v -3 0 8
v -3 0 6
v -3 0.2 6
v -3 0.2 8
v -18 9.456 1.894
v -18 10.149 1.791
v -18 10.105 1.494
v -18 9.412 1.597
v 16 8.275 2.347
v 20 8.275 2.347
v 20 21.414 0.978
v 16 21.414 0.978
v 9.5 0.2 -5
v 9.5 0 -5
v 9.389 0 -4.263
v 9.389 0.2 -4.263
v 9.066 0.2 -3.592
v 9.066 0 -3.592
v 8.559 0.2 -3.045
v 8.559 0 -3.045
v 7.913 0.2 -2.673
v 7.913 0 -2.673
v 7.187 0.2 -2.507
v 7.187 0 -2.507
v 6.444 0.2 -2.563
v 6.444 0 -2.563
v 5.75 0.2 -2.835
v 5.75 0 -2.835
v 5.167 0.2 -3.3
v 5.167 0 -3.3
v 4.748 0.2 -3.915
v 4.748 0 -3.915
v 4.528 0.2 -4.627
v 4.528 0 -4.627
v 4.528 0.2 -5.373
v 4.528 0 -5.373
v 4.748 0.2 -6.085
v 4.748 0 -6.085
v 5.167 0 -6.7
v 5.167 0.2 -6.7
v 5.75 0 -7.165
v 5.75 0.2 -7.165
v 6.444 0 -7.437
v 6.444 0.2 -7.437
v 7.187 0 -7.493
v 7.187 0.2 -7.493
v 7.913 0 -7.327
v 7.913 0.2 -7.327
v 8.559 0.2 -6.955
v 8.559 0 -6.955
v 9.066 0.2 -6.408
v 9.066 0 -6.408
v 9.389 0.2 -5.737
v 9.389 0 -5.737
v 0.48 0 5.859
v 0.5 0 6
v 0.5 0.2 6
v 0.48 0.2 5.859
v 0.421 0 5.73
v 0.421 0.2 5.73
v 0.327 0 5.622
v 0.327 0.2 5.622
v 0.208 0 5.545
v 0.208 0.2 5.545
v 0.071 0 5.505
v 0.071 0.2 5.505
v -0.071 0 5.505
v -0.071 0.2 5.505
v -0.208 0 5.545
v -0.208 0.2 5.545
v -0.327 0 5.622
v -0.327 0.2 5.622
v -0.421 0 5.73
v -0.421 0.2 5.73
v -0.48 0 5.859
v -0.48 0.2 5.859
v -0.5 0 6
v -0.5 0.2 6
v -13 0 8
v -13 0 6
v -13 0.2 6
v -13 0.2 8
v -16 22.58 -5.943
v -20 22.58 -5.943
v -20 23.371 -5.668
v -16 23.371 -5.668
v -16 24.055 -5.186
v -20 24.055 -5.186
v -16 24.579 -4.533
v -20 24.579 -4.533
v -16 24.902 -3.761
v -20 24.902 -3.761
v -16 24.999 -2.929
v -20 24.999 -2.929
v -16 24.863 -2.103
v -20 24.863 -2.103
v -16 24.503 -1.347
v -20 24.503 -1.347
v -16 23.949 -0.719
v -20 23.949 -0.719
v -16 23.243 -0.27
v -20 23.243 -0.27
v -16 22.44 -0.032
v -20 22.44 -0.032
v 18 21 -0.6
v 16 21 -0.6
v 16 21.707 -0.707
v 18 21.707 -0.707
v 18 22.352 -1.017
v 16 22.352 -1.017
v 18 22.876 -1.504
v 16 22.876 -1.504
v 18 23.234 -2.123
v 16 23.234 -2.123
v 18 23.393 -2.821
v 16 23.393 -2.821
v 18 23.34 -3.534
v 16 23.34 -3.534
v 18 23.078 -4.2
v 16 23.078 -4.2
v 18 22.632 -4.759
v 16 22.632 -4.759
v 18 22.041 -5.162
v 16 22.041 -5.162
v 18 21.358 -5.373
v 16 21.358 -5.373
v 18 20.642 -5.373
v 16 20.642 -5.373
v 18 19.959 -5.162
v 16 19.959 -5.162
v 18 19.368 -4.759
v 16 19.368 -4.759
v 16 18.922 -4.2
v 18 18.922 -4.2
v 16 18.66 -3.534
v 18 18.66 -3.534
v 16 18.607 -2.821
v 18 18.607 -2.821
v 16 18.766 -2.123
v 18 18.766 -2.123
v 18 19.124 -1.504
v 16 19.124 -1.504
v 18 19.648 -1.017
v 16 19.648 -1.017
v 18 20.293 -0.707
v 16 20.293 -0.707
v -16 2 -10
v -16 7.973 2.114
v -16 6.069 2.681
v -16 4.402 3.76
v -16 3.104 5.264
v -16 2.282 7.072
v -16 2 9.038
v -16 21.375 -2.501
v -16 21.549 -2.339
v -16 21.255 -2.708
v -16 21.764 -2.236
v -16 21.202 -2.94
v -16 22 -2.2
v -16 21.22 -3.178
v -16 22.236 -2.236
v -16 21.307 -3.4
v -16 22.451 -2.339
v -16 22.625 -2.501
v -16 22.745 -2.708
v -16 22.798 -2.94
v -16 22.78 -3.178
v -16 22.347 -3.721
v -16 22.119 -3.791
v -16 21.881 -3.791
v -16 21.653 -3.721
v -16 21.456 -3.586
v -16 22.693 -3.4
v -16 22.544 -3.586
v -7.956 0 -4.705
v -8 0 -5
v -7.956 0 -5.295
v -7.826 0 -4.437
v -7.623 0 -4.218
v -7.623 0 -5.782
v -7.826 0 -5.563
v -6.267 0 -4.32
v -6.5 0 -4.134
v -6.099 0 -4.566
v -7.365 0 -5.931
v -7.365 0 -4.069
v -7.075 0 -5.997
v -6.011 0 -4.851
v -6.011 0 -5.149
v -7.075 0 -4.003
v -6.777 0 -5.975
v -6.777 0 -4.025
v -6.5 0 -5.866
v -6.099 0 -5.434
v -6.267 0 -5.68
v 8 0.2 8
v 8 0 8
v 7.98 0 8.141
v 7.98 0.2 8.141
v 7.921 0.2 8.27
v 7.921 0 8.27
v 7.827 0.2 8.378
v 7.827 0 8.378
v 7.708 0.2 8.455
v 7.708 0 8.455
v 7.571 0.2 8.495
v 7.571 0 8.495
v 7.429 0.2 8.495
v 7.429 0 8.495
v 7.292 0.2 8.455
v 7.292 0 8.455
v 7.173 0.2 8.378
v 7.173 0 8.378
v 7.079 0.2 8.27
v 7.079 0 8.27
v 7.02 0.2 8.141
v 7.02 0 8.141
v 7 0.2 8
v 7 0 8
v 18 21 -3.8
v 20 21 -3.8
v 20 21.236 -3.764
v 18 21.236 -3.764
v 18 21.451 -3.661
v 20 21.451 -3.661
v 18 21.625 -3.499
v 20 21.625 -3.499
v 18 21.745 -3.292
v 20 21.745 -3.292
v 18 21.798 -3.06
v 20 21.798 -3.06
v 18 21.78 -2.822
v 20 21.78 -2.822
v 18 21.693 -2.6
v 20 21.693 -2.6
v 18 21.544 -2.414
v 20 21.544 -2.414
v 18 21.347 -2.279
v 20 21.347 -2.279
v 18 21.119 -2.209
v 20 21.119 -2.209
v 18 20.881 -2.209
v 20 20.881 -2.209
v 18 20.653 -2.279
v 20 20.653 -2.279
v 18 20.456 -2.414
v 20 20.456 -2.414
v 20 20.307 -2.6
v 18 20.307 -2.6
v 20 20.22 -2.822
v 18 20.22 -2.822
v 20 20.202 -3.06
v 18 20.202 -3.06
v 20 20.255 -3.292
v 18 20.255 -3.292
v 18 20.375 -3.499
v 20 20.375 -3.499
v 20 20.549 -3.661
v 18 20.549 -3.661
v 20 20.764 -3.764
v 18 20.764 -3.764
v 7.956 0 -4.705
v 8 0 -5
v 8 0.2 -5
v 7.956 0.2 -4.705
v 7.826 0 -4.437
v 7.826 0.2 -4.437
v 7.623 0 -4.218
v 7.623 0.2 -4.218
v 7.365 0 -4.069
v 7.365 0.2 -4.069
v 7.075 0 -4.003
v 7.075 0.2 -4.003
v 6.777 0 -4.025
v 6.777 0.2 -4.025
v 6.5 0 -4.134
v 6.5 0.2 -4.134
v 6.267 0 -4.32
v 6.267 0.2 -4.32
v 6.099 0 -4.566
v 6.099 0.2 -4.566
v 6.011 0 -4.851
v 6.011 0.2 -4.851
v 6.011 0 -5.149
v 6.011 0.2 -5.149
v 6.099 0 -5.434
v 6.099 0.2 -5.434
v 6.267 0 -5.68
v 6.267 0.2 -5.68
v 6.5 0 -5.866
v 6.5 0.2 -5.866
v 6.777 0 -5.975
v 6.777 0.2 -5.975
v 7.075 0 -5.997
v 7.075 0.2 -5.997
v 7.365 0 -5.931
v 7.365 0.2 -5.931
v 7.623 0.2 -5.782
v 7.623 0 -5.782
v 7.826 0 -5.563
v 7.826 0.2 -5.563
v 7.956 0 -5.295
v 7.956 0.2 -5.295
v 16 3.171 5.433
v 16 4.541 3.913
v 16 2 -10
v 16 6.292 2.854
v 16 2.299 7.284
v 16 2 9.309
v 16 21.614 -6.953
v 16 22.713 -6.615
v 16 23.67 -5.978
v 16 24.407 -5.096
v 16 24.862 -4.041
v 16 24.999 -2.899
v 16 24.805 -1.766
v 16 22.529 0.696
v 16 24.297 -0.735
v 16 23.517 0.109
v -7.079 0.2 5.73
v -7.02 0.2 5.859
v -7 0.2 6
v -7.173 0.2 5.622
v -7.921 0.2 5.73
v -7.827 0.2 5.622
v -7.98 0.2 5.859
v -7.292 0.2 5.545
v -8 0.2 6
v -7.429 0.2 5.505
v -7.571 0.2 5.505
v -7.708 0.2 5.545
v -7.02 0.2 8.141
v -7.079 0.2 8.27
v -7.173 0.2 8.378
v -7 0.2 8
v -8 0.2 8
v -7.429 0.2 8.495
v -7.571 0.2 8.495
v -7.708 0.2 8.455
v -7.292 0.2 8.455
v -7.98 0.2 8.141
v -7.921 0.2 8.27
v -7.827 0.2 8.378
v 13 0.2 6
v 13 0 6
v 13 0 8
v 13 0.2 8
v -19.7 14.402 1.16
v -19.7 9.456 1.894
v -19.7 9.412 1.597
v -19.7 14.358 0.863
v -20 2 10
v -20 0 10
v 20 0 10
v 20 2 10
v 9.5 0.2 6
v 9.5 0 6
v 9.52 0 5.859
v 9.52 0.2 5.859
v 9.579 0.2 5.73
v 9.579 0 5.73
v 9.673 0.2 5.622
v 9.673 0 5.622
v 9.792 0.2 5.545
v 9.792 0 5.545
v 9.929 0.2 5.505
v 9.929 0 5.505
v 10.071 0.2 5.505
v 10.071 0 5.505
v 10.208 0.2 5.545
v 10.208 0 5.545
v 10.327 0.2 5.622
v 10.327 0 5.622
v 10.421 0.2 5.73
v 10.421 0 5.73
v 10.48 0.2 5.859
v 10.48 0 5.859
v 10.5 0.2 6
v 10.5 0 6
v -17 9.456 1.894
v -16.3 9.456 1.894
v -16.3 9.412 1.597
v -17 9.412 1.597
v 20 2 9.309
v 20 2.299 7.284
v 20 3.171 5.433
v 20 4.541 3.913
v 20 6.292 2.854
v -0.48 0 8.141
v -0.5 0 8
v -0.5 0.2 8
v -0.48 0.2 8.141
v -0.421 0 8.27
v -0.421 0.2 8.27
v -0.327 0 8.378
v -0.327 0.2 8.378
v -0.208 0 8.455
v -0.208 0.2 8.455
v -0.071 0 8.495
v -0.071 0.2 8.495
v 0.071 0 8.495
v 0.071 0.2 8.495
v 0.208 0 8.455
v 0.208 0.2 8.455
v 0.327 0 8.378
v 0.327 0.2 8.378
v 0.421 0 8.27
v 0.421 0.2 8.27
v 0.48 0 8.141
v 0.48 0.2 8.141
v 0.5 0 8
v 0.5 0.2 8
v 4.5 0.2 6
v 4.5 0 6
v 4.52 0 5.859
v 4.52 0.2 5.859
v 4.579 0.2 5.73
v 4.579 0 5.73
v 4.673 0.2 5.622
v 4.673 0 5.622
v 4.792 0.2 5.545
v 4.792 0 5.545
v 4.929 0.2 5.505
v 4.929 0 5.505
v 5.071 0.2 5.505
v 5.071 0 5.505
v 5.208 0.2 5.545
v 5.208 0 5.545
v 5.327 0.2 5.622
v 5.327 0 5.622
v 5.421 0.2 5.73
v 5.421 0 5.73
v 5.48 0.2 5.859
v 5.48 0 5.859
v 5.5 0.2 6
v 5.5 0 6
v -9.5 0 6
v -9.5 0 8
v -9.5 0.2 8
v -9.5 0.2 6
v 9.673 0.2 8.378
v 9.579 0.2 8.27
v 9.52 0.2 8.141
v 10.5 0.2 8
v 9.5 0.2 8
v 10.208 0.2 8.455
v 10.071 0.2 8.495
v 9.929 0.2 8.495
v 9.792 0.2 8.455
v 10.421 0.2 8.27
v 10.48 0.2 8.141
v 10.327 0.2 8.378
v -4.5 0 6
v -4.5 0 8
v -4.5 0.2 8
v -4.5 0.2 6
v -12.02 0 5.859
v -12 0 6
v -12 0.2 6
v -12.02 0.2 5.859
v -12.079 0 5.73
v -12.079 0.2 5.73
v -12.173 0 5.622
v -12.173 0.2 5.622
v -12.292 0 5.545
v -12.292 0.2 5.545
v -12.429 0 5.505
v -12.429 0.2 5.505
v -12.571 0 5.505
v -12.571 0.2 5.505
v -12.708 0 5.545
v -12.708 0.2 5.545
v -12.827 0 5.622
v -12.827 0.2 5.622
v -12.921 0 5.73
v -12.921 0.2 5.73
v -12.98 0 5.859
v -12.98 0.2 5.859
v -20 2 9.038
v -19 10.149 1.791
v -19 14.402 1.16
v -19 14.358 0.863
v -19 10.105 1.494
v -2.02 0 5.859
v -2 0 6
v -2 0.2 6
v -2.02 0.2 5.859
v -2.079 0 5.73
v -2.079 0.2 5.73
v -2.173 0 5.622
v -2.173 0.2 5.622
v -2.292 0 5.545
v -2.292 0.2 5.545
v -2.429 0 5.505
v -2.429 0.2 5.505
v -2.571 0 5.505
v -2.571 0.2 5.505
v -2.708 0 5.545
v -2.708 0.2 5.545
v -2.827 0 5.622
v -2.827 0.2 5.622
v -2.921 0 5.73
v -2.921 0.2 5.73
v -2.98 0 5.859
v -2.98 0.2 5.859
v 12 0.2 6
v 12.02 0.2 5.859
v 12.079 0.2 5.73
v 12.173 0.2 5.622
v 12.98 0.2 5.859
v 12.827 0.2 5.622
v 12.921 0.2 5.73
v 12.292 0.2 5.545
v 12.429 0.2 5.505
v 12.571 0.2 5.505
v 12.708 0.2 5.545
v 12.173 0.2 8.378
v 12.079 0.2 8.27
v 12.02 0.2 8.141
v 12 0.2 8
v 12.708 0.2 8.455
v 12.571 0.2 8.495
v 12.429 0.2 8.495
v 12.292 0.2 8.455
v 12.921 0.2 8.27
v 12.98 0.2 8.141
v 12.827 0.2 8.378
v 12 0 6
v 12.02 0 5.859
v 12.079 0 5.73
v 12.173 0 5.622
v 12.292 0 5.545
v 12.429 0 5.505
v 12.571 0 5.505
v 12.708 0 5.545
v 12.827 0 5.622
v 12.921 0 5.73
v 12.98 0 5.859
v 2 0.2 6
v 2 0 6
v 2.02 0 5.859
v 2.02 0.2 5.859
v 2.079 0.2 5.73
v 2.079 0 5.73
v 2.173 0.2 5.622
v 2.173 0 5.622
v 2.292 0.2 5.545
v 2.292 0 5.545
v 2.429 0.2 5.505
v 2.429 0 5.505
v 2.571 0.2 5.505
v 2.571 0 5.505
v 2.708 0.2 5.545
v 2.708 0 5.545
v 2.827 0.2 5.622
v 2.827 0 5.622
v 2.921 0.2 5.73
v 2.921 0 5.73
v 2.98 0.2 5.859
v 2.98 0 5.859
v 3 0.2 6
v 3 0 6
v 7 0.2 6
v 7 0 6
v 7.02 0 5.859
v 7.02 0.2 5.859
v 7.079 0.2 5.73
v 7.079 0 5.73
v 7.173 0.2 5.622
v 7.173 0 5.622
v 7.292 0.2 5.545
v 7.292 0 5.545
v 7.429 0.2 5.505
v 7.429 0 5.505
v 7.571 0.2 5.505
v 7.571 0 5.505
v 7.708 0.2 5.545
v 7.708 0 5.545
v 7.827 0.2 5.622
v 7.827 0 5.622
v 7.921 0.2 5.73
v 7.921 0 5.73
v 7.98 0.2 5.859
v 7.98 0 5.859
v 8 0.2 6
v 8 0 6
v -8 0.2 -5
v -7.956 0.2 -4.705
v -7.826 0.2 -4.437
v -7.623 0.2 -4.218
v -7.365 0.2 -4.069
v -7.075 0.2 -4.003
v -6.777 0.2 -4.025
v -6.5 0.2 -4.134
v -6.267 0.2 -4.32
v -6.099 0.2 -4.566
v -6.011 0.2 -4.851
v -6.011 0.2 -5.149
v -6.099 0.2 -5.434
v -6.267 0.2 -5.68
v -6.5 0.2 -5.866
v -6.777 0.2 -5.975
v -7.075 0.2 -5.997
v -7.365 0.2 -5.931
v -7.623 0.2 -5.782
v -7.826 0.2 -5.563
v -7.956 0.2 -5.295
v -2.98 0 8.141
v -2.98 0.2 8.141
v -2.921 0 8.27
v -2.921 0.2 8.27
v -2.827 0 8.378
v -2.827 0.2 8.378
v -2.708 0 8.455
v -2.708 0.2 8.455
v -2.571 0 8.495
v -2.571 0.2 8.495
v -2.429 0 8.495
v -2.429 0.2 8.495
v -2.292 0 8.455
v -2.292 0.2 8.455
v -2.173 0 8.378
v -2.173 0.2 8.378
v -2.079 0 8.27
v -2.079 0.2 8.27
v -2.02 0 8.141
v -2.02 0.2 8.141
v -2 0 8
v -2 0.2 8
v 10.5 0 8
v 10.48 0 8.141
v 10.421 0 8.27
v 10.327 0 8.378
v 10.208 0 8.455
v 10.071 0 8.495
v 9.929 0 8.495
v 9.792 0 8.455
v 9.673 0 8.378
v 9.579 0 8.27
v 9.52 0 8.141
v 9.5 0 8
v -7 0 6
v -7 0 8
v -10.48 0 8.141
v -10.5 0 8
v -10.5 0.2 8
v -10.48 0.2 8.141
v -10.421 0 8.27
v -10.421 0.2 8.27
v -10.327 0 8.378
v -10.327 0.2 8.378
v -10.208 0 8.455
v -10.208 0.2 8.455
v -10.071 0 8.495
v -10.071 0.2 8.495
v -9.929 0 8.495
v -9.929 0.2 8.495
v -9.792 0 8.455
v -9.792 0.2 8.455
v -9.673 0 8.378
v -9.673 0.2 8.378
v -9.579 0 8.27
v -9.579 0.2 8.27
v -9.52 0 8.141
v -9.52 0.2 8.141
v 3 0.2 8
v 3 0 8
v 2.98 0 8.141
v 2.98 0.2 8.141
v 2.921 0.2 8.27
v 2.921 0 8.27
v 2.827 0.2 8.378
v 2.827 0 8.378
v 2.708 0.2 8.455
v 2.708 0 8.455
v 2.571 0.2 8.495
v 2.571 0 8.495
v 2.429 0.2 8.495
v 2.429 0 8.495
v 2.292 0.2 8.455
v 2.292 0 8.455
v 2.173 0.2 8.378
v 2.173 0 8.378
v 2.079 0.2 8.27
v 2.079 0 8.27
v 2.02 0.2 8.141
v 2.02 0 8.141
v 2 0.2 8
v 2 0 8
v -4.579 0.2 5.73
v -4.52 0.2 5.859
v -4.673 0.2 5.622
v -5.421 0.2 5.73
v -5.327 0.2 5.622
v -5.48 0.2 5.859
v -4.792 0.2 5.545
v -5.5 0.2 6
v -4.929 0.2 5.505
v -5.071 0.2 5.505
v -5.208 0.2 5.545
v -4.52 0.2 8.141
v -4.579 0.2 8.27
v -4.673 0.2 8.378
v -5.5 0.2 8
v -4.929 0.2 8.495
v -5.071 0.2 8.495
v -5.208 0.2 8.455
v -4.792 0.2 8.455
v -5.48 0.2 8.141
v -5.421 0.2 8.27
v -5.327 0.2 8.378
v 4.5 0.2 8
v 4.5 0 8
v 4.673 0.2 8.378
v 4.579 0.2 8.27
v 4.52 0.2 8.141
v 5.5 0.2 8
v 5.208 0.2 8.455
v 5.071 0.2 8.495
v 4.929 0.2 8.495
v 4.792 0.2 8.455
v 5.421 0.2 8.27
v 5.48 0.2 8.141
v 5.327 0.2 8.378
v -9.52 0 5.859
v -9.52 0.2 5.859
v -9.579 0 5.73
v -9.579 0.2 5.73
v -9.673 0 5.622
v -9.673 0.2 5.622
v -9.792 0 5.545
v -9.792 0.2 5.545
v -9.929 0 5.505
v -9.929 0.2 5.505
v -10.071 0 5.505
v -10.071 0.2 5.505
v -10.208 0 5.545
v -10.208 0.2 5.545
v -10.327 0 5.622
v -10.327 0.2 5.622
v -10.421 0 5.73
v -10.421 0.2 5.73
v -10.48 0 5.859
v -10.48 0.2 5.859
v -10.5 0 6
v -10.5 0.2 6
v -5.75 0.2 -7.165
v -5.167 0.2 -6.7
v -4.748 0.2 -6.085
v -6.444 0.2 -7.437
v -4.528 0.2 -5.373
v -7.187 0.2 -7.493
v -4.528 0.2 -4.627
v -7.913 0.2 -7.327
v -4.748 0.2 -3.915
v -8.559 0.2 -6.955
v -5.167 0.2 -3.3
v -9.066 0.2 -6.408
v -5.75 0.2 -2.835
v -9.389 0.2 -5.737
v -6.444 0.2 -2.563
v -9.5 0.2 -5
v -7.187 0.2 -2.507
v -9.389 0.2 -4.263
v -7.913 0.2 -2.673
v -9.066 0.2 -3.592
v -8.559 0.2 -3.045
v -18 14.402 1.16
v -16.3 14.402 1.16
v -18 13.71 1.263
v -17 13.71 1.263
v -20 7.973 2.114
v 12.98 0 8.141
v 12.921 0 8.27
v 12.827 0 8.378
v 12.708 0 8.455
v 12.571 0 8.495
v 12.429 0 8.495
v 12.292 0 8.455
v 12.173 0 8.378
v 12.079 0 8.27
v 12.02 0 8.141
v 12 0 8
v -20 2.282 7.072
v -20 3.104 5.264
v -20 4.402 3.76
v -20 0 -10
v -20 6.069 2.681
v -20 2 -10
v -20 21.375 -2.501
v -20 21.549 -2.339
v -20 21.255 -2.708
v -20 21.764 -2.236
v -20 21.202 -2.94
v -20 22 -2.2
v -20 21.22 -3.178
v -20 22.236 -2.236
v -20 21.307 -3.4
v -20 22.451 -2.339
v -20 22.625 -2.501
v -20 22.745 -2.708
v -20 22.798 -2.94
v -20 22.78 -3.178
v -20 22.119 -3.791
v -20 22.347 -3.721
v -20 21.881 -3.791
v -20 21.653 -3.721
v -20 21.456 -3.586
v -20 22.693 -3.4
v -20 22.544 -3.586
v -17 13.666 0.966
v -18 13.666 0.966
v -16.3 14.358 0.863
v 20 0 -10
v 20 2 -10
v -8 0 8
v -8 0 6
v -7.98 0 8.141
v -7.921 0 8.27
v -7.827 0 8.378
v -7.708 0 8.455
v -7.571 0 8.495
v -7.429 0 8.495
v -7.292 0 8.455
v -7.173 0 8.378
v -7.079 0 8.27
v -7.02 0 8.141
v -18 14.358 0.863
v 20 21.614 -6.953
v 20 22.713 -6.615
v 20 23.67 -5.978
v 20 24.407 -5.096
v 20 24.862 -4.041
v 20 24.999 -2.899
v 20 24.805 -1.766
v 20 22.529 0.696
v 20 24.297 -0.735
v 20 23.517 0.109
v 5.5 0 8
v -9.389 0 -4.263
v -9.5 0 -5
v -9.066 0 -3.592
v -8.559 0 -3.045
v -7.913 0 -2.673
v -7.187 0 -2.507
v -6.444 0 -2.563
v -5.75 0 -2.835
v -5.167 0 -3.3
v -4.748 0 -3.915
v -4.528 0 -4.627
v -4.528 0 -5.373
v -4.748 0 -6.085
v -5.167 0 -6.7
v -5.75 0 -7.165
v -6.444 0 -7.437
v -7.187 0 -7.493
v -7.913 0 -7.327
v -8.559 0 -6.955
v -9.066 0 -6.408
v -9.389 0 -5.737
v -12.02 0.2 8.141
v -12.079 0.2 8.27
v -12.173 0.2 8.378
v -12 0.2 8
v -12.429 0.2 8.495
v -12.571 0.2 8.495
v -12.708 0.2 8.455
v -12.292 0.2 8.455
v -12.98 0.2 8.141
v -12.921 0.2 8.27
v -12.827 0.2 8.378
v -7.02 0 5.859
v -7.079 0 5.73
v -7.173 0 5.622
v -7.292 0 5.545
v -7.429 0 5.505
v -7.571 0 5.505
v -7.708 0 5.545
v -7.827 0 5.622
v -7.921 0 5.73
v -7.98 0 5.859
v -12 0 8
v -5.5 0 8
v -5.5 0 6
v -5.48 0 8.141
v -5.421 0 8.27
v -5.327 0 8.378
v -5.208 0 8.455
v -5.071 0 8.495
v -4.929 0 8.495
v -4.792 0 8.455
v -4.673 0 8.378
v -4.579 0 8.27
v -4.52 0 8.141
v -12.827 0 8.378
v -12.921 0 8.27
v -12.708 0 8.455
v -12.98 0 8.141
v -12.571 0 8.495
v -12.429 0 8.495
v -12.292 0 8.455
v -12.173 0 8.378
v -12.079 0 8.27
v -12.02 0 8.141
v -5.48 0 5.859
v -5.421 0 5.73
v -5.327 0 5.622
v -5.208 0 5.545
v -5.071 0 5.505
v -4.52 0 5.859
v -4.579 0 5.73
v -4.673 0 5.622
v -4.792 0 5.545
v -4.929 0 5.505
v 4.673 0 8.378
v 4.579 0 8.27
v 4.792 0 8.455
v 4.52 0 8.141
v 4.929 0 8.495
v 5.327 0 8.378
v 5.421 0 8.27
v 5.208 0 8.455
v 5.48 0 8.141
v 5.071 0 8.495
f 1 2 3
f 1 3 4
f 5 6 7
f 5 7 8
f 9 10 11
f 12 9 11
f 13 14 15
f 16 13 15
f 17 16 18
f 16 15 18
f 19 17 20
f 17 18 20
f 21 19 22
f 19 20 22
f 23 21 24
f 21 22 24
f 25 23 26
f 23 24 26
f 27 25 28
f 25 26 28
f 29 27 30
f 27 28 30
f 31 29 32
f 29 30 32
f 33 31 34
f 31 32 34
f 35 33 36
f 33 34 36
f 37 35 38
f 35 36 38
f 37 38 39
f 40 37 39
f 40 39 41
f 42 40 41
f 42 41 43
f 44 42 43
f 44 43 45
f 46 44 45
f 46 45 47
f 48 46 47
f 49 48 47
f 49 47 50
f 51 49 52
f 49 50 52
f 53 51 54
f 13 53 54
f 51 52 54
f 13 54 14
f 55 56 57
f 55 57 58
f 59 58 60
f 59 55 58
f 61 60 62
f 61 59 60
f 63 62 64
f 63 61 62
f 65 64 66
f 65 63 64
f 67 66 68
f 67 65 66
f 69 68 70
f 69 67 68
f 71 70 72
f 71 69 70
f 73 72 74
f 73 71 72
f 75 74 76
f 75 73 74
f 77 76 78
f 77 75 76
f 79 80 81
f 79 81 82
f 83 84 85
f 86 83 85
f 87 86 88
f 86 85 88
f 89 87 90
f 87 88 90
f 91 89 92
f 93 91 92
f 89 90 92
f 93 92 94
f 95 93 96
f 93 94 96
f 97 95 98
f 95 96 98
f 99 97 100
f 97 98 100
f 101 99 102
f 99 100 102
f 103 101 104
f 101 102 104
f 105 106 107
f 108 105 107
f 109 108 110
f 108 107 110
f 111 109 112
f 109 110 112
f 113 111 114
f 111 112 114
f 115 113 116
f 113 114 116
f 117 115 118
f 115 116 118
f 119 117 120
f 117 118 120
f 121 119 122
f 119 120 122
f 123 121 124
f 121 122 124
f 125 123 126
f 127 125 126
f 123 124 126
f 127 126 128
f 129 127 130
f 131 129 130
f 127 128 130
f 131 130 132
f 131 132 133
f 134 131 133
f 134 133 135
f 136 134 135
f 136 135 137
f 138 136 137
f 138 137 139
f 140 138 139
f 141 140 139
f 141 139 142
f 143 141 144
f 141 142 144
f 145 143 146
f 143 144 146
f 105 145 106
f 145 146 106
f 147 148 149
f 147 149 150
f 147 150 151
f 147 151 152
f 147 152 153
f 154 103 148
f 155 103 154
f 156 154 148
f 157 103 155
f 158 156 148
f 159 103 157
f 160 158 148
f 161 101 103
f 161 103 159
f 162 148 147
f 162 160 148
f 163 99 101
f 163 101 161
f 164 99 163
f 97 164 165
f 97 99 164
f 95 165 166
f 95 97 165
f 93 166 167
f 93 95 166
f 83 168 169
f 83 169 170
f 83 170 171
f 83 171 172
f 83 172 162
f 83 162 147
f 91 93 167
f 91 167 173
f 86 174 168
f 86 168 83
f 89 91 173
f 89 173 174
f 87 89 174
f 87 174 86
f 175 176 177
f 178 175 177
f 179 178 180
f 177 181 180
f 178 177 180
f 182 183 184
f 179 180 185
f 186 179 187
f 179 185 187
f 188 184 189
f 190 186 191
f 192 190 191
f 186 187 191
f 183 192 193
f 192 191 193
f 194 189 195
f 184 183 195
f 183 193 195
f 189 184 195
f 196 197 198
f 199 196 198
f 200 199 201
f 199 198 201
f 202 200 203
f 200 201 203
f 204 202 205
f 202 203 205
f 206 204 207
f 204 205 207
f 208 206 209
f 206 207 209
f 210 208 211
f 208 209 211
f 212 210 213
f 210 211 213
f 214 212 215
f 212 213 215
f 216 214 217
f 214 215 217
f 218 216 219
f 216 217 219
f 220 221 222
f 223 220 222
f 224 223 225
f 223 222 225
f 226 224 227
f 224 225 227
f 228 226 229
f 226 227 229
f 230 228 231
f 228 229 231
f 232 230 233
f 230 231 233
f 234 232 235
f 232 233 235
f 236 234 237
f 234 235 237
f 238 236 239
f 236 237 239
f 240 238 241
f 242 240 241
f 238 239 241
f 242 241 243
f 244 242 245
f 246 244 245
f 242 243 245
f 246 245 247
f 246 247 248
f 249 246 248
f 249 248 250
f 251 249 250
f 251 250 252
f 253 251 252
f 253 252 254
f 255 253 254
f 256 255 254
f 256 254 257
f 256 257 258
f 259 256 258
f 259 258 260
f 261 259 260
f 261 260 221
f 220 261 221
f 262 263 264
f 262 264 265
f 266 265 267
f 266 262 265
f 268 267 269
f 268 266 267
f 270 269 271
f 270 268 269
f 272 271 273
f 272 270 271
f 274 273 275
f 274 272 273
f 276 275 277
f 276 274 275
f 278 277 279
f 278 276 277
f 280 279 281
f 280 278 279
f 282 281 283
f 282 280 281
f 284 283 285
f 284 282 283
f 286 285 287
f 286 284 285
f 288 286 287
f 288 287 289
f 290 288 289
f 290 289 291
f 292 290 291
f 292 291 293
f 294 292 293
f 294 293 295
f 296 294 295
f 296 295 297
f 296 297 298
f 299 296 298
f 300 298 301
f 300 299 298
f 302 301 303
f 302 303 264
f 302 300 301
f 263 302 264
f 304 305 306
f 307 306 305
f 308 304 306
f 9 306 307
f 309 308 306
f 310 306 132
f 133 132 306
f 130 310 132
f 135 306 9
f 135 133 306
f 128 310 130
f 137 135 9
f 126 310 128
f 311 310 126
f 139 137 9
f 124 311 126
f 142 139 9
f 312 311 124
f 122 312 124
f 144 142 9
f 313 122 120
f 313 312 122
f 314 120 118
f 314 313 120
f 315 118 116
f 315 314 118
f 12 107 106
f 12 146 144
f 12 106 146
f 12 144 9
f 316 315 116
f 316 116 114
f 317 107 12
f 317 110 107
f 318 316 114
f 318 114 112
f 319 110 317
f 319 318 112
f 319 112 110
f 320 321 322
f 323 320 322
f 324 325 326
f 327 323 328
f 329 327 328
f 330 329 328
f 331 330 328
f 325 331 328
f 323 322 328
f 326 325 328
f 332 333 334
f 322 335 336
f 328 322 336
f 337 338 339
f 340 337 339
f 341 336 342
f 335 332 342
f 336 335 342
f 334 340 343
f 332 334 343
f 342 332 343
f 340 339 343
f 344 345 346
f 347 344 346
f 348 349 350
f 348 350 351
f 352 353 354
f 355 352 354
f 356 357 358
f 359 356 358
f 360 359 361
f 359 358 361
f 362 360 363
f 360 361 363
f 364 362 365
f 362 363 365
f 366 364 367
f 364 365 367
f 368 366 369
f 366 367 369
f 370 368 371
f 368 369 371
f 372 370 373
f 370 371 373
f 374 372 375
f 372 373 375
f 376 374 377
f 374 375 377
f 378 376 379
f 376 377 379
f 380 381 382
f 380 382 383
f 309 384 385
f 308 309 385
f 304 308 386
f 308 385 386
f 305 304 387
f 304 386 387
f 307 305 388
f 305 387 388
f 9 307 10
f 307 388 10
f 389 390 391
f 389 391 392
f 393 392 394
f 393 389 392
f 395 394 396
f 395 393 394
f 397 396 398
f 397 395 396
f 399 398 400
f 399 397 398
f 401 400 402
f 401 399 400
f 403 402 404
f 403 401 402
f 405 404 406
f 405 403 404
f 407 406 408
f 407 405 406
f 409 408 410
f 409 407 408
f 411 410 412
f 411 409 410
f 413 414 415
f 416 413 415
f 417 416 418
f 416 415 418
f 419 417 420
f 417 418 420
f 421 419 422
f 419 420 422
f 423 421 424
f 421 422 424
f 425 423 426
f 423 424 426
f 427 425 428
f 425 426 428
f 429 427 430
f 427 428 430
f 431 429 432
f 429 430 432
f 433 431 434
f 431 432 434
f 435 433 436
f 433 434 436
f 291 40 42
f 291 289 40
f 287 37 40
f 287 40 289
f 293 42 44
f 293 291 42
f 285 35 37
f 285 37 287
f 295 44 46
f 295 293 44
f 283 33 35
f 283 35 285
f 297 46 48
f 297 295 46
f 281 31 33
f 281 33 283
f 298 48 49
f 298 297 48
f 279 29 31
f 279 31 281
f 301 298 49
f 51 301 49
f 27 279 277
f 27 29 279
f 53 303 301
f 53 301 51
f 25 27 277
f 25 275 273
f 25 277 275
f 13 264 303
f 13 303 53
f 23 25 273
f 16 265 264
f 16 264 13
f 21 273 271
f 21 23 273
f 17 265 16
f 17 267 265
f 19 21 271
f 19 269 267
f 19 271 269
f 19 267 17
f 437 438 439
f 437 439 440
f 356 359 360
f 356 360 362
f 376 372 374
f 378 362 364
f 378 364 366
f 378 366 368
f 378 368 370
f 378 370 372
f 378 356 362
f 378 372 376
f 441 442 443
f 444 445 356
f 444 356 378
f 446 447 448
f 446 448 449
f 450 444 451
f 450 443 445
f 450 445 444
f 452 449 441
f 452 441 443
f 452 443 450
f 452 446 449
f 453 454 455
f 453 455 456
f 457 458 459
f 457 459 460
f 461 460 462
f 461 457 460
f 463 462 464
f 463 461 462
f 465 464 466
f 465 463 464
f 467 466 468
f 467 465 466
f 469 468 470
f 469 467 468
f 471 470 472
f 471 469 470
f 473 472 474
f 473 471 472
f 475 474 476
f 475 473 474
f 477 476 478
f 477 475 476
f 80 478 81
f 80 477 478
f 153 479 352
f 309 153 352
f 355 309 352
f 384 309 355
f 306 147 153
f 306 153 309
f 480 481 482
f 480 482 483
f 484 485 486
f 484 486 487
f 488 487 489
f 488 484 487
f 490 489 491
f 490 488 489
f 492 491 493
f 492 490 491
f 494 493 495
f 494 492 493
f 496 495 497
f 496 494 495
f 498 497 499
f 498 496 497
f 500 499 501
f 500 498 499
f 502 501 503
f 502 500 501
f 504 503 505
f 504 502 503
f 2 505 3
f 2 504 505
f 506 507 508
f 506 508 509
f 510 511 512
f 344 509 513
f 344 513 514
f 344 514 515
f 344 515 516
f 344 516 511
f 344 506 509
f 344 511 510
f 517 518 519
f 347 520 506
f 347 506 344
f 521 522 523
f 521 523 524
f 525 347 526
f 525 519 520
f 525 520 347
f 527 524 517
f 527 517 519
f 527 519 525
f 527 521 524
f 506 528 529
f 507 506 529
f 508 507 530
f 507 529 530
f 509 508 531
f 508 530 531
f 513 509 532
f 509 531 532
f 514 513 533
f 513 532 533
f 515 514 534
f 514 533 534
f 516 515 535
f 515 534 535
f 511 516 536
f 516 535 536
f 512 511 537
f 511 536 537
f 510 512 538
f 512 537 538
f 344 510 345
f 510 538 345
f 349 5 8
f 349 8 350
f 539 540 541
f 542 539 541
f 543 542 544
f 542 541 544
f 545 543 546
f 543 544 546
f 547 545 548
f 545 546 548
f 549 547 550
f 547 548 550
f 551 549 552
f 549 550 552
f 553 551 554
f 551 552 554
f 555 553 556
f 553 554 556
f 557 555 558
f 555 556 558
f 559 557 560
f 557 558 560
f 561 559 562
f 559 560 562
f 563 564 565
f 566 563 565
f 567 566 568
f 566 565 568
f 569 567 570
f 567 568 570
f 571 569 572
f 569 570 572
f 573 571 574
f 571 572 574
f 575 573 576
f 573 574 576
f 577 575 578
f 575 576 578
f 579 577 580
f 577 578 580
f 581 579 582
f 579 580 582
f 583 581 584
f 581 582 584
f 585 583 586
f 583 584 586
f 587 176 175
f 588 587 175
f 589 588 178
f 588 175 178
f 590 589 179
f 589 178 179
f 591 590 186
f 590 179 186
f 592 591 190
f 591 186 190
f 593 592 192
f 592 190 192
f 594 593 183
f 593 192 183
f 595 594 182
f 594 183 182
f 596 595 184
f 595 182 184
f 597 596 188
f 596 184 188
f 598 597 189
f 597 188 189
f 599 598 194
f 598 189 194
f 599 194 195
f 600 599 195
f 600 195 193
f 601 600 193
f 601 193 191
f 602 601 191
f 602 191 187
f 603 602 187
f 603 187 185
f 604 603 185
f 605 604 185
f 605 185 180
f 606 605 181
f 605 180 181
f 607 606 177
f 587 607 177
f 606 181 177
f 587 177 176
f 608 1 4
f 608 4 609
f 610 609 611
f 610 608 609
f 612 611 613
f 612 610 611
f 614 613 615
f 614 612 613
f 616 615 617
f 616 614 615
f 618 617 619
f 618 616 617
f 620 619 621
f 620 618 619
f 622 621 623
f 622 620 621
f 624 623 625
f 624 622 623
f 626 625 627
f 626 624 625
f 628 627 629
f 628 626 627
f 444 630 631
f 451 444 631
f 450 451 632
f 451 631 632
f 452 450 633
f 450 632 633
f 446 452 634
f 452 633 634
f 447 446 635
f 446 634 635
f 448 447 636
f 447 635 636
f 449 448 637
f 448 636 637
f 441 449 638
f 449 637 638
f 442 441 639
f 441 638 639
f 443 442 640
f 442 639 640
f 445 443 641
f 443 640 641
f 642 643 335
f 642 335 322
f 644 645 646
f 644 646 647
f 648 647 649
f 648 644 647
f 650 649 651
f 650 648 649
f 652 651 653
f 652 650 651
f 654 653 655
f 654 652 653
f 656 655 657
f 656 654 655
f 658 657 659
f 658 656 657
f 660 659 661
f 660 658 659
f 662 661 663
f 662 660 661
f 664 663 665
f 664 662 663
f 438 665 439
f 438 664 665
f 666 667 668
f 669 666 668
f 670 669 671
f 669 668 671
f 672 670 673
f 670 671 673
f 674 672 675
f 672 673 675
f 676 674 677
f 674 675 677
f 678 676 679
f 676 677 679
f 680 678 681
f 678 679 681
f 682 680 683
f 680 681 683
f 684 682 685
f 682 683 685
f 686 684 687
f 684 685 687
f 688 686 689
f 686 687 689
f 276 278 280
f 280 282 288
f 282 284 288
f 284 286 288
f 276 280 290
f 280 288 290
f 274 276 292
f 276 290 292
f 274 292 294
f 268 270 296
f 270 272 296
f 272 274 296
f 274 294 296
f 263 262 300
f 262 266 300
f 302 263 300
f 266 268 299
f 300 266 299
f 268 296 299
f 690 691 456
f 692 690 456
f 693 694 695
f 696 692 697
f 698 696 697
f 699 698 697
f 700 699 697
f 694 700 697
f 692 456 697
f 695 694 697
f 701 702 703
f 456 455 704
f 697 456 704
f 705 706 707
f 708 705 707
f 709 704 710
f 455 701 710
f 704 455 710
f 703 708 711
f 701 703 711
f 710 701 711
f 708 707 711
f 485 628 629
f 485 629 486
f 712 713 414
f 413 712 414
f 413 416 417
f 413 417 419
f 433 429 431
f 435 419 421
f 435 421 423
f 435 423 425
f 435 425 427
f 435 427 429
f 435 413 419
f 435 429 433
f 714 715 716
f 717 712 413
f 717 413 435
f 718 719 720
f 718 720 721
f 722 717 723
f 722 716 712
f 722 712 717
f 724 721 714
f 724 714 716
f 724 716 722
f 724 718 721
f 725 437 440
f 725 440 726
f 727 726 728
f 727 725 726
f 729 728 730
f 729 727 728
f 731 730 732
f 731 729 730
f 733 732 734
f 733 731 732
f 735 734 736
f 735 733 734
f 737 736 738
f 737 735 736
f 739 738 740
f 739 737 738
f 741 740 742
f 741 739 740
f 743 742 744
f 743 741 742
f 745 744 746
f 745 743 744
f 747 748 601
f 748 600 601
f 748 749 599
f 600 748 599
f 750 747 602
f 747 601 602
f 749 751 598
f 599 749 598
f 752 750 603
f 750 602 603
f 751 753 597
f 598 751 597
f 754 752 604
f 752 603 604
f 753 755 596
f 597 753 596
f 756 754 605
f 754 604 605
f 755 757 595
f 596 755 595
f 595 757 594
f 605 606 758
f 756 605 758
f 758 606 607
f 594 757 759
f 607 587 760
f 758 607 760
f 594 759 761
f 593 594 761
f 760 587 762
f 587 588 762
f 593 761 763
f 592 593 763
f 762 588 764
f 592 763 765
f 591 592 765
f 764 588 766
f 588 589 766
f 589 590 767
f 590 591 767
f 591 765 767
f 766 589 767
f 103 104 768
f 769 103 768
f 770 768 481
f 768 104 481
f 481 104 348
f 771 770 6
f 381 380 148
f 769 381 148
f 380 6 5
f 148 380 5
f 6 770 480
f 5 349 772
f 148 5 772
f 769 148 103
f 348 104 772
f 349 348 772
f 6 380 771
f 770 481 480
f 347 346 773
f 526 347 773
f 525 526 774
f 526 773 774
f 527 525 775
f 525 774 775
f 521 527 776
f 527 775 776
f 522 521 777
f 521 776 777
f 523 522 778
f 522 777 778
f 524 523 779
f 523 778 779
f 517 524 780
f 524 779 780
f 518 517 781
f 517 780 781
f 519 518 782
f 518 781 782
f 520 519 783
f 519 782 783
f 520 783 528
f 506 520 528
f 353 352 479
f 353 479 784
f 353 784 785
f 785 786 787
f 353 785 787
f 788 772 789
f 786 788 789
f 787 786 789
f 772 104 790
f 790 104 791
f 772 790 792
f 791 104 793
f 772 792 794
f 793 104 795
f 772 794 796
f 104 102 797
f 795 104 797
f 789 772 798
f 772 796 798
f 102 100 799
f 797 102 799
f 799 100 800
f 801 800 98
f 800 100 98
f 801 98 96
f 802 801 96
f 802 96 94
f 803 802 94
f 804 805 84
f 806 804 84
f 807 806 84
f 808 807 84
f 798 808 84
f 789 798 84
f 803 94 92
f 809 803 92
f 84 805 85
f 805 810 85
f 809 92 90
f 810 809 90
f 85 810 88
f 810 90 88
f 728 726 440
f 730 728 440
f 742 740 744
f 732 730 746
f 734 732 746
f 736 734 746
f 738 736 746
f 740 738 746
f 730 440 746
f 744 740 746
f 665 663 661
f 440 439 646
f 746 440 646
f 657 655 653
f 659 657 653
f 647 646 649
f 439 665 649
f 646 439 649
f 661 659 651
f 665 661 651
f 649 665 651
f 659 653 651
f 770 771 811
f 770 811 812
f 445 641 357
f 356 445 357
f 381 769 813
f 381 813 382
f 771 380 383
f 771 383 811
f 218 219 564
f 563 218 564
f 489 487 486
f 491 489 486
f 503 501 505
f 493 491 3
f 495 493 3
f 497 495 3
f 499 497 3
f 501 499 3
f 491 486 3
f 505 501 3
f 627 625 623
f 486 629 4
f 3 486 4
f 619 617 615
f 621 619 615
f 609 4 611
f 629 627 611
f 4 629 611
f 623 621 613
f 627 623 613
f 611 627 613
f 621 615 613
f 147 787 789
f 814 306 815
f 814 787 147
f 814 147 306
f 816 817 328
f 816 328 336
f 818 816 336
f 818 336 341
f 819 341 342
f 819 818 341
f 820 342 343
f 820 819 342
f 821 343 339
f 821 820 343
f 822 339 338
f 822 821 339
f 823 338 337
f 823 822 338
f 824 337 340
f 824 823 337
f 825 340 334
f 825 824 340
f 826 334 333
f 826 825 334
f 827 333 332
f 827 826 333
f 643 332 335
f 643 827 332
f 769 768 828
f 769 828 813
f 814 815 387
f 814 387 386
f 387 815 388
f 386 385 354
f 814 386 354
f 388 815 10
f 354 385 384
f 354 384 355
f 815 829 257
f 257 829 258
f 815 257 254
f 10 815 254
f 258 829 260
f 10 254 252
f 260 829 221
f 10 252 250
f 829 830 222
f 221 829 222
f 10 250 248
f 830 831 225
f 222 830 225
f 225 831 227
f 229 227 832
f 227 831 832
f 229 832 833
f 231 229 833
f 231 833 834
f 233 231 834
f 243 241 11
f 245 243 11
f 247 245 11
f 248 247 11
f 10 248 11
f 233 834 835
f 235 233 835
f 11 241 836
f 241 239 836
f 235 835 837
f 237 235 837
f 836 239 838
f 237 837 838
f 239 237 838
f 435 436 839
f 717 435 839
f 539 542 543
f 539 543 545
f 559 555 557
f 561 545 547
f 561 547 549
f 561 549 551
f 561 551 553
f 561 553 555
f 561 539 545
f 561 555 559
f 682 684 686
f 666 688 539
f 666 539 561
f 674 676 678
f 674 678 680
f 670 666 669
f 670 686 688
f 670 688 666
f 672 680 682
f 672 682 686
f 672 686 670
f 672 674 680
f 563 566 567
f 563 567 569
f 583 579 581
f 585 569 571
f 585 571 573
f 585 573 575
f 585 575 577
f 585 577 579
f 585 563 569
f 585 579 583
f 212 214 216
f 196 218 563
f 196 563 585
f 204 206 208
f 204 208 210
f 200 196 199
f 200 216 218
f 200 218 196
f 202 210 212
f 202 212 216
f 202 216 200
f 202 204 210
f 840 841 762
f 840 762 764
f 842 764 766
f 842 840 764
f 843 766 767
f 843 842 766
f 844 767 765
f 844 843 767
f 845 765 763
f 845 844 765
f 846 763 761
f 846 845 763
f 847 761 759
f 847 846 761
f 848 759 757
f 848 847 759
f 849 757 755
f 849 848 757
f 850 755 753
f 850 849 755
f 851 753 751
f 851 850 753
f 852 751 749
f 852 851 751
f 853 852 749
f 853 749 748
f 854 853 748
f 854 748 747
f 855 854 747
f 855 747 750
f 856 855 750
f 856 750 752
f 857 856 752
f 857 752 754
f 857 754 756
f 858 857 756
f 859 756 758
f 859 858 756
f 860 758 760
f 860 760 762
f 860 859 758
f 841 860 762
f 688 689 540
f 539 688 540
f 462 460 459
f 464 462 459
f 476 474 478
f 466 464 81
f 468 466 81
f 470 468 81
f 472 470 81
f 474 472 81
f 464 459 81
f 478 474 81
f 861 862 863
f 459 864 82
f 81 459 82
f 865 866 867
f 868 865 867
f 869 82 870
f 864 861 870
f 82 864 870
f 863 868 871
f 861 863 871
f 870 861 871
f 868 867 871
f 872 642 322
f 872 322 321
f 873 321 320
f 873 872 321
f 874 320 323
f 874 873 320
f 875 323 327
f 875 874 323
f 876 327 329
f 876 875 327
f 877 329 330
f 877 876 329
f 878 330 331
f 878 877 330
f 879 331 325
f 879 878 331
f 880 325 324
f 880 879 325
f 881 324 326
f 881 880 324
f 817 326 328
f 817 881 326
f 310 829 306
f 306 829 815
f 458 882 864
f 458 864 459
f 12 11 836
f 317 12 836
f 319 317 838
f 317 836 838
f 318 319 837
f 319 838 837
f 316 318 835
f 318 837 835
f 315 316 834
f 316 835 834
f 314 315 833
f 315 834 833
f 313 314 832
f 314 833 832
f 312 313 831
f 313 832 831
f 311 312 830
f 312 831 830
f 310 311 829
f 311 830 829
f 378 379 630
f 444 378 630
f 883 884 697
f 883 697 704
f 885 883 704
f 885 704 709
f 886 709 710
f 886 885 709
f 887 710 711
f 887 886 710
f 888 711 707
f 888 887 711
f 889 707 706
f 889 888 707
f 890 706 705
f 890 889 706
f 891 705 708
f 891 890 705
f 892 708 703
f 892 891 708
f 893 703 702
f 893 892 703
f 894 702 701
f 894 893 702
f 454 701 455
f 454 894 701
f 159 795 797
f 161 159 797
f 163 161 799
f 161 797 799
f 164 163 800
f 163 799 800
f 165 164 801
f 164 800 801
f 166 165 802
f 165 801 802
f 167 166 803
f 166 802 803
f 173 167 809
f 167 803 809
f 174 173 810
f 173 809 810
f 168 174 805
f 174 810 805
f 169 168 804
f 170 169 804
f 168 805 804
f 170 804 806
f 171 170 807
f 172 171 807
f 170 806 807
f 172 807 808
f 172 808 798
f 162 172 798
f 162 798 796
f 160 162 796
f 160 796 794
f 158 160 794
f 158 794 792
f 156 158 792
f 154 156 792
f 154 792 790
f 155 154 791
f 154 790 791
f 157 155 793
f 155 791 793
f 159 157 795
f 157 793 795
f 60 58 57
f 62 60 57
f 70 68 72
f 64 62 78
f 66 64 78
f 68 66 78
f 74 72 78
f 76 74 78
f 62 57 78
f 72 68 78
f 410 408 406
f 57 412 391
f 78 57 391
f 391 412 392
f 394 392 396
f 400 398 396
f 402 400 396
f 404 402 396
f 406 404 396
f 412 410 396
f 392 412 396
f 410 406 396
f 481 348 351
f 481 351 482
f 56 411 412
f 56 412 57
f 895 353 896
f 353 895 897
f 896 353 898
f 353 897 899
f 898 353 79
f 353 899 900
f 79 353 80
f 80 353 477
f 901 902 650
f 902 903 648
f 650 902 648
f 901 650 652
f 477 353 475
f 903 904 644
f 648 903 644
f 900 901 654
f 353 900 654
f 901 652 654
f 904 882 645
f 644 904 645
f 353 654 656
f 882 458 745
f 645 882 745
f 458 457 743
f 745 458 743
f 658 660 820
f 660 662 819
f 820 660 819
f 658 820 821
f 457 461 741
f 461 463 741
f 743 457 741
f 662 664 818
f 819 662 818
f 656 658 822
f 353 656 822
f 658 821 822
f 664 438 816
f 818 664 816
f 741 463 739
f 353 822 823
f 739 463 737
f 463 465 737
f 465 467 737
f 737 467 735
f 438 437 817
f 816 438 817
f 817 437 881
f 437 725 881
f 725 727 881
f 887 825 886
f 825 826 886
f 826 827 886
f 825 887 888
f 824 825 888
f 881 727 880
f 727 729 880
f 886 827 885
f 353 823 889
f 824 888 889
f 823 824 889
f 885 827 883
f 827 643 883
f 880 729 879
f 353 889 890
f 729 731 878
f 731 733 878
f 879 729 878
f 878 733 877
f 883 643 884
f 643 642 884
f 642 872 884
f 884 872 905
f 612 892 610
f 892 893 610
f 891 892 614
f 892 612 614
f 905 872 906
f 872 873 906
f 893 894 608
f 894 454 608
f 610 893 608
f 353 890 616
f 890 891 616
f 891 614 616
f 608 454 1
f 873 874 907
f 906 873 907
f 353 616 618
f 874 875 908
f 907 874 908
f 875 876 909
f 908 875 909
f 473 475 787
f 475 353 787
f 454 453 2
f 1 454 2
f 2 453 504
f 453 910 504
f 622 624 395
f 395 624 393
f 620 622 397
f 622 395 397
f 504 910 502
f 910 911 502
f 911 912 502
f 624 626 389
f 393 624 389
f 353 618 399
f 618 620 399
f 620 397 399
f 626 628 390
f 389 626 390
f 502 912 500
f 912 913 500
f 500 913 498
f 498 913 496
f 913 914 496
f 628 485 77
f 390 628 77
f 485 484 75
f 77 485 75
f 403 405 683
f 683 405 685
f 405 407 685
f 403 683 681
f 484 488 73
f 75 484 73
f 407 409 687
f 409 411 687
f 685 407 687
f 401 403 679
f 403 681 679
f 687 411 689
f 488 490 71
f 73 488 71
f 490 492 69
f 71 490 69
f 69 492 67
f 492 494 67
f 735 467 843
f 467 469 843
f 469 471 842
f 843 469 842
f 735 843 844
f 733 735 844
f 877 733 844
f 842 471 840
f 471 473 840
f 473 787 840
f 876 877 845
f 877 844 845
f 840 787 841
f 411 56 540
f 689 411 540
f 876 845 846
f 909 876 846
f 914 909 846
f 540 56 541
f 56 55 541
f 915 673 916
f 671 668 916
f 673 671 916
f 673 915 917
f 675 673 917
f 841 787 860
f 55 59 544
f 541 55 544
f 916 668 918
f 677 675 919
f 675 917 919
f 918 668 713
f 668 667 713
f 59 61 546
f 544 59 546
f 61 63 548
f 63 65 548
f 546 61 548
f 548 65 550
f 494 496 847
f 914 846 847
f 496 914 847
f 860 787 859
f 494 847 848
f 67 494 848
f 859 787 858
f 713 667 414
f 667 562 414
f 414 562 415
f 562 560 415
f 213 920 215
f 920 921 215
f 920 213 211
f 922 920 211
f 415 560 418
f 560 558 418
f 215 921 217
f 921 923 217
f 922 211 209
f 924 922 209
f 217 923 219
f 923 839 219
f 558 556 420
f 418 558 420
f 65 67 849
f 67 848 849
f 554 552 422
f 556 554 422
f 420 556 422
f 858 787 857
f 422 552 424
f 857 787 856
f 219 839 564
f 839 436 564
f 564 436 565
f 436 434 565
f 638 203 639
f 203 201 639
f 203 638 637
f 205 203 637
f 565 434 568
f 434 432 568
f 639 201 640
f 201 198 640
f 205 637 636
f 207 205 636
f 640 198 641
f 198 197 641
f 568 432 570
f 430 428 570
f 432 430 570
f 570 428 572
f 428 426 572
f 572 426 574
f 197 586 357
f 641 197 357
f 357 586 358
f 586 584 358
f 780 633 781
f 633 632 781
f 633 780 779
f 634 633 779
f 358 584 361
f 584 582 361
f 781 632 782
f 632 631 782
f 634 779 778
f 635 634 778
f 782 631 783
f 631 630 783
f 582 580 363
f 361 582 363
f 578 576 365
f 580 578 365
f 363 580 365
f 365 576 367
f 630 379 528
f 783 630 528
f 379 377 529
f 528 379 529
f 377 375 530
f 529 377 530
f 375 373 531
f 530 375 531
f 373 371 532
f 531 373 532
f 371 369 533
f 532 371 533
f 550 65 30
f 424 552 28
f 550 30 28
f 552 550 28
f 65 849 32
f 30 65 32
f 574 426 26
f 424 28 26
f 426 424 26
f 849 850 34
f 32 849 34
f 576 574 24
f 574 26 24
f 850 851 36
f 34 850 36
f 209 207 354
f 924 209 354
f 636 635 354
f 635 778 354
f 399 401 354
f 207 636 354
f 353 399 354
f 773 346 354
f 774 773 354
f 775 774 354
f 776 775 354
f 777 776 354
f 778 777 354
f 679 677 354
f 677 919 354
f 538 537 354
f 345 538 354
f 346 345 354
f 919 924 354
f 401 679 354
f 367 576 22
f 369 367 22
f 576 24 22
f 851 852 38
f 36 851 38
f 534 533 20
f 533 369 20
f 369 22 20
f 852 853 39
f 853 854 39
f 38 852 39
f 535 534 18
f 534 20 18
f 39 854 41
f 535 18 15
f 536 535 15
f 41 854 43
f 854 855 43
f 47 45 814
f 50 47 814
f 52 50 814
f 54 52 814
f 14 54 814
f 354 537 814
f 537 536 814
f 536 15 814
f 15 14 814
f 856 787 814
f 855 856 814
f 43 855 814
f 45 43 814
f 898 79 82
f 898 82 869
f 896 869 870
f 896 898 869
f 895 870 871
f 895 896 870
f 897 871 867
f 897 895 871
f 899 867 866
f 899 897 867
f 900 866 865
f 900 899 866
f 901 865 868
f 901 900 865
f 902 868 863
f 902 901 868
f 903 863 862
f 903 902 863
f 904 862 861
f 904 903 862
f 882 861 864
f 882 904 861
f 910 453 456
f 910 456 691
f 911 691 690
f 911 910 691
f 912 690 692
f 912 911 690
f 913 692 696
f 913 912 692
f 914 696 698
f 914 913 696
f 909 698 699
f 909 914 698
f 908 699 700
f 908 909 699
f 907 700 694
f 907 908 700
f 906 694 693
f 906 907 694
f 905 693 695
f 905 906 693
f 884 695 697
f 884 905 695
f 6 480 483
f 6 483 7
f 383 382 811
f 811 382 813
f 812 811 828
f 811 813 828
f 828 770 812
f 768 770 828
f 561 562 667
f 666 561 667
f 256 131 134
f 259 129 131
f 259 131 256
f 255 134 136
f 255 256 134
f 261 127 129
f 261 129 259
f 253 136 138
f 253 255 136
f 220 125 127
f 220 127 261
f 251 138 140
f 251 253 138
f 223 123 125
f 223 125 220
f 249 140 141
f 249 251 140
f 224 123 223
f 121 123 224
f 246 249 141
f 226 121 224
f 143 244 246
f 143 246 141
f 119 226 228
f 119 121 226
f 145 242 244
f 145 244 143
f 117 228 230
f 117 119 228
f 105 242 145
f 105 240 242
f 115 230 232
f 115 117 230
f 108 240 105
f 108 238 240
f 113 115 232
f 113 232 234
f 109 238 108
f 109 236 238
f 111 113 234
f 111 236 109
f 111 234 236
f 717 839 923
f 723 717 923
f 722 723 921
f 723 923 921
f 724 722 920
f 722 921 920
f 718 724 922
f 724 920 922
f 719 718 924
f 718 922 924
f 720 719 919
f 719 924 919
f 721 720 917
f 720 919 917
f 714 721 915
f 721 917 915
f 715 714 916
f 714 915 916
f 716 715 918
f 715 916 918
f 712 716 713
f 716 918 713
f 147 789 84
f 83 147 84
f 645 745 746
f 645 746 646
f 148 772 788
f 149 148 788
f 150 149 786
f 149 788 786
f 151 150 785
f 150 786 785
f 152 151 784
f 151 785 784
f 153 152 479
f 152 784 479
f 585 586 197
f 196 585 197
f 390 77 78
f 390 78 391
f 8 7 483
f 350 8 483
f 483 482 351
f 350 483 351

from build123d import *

# Parameters (mm, degrees)
CROQUIS1_W              = 40
CROQUIS1_H              = 20
SALIENTE_EXTRUIR1_DEPTH = 2
CROQUIS3_R              = 0.8
SALIENTE_EXTRUIR2_DEPTH = 4
CROQUIS4_R              = 2.5
CROQUIS4_R_2            = 1
CORTAR_EXTRUIR1_DEPTH   = 0.2
CROQUIS6_R              = 0.8
SALIENTE_EXTRUIR3_DEPTH = 4
CROQUIS10_R             = 2.4
CORTAR_EXTRUIR4_DEPTH   = 2
CORTAR_EXTRUIR5_DEPTH   = 0.3


with BuildPart() as part:
    # Croquis1 → Saliente-Extruir1 (new body)
    with BuildSketch(Plane(origin=(0, 0, 0), x_dir=(1, 0, 0), z_dir=(0, 1, 0))):
        Rectangle(CROQUIS1_W, CROQUIS1_H)
    extrude(amount=SALIENTE_EXTRUIR1_DEPTH)

    # Croquis3 → Saliente-Extruir2 (add)
    with BuildSketch(Plane(origin=(20, 0, 0), x_dir=(0, 0, -1), z_dir=(1, 0, 0))):
        with BuildLine():
            Line((-2.346611166, 8.275044598), (-0.978490727, 21.414260229))
            ThreePointArc((-0.978490727, 21.414260229), (2.899239812, 24.998730722), (6.952577869, 21.614107636))
            Line((6.952577869, 21.614107636), (10, 2))
            Line((10, 2), (-9.308969938, 2))
            ThreePointArc((-9.308969938, 2), (-4.622536743, 3.8002554), (-2.346611166, 8.275044598))
        make_face()
        with Locations((3, 21)):
            Circle(CROQUIS3_R, mode=Mode.SUBTRACT)
    extrude(amount=-SALIENTE_EXTRUIR2_DEPTH)

    # Croquis4 → Cortar-Extruir1 (cut)
    with BuildSketch(Plane.XZ):
        with Locations((7, -5)):
            Circle(CROQUIS4_R)
        with Locations((7, -5)):
            Circle(CROQUIS4_R_2, mode=Mode.SUBTRACT)
        with BuildLine():
            Line((0.5, 8), (0.5, 6))
            ThreePointArc((0.5, 6), (0, 5.5), (-0.5, 6))
            Line((-0.5, 6), (-0.5, 8))
            ThreePointArc((-0.5, 8), (0, 8.5), (0.5, 8))
        make_face()
        with BuildLine():
            Line((2, 8), (2, 6))
            ThreePointArc((2, 6), (2.5, 5.5), (3, 6))
            Line((3, 6), (3, 8))
            ThreePointArc((3, 8), (2.5, 8.5), (2, 8))
        make_face()
        with BuildLine():
            Line((4.5, 8), (4.5, 6))
            ThreePointArc((4.5, 6), (5, 5.5), (5.5, 6))
            Line((5.5, 6), (5.5, 8))
            ThreePointArc((5.5, 8), (5, 8.5), (4.5, 8))
        make_face()
        with BuildLine():
            Line((7, 8), (7, 6))
            ThreePointArc((7, 6), (7.5, 5.5), (8, 6))
            Line((8, 6), (8, 8))
            ThreePointArc((8, 8), (7.5, 8.5), (7, 8))
        make_face()
        with BuildLine():
            Line((9.5, 8), (9.5, 6))
            ThreePointArc((9.5, 6), (10, 5.5), (10.5, 6))
            Line((10.5, 6), (10.5, 8))
            ThreePointArc((10.5, 8), (10, 8.5), (9.5, 8))
        make_face()
        with BuildLine():
            Line((12, 8), (12, 6))
            ThreePointArc((12, 6), (12.5, 5.5), (13, 6))
            Line((13, 6), (13, 8))
            ThreePointArc((13, 8), (12.5, 8.5), (12, 8))
        make_face()
    cortar_extruir1 = extrude(amount=-CORTAR_EXTRUIR1_DEPTH, mode=Mode.SUBTRACT)

    # Simetría2: Cortar-Extruir1 across plane
    add(cortar_extruir1.mirror(Plane(origin=(0, 0, 0), x_dir=(0, 0, 1), z_dir=(1, 0, 0))), mode=Mode.SUBTRACT)

    # Croquis6 → Saliente-Extruir3 (add)
    with BuildSketch(Plane.ZY.offset(20)):
        with BuildLine():
            Line((-10, 2), (-5.943364405, 22.580177542))
            ThreePointArc((-5.943364405, 22.580177542), (-2.929004345, 24.999159819), (-0.032480048, 22.440255986))
            Line((-0.032480048, 22.440255986), (2.113895498, 7.972736033))
            ThreePointArc((2.113895498, 7.972736033), (4.465956479, 3.699488338), (9.03810872, 2))
            Line((9.03810872, 2), (-10, 2))
        make_face()
        with Locations((-3, 22)):
            Circle(CROQUIS6_R, mode=Mode.SUBTRACT)
    extrude(amount=-SALIENTE_EXTRUIR3_DEPTH)

    # Croquis10 → Cortar-Extruir4 (cut)
    with BuildSketch(Plane.ZY.offset(-16)):
        with Locations((-3, 21)):
            Circle(CROQUIS10_R)
    extrude(amount=-CORTAR_EXTRUIR4_DEPTH, mode=Mode.SUBTRACT)

    # Croquis11 → Cortar-Extruir5 (cut)
    with BuildSketch(Plane(origin=(0, 0.47856177, 3.225717872), x_dir=(1, 0, 0), z_dir=(0, 0.146751995, 0.989173317))):
        Polygon((-16.3, 9.076199369), (-17, 9.076199369), (-17, 13.376199369), (-18, 13.376199369), (-18, 14.076199369), (-16.3, 14.076199369), align=None)
        Polygon((-19.7, 9.076199369), (-19.7, 14.076199369), (-19, 14.076199369), (-19, 9.776199369), (-18, 9.776199369), (-18, 9.076199369), align=None)
    extrude(amount=-CORTAR_EXTRUIR5_DEPTH, mode=Mode.SUBTRACT)


solid = part.part
